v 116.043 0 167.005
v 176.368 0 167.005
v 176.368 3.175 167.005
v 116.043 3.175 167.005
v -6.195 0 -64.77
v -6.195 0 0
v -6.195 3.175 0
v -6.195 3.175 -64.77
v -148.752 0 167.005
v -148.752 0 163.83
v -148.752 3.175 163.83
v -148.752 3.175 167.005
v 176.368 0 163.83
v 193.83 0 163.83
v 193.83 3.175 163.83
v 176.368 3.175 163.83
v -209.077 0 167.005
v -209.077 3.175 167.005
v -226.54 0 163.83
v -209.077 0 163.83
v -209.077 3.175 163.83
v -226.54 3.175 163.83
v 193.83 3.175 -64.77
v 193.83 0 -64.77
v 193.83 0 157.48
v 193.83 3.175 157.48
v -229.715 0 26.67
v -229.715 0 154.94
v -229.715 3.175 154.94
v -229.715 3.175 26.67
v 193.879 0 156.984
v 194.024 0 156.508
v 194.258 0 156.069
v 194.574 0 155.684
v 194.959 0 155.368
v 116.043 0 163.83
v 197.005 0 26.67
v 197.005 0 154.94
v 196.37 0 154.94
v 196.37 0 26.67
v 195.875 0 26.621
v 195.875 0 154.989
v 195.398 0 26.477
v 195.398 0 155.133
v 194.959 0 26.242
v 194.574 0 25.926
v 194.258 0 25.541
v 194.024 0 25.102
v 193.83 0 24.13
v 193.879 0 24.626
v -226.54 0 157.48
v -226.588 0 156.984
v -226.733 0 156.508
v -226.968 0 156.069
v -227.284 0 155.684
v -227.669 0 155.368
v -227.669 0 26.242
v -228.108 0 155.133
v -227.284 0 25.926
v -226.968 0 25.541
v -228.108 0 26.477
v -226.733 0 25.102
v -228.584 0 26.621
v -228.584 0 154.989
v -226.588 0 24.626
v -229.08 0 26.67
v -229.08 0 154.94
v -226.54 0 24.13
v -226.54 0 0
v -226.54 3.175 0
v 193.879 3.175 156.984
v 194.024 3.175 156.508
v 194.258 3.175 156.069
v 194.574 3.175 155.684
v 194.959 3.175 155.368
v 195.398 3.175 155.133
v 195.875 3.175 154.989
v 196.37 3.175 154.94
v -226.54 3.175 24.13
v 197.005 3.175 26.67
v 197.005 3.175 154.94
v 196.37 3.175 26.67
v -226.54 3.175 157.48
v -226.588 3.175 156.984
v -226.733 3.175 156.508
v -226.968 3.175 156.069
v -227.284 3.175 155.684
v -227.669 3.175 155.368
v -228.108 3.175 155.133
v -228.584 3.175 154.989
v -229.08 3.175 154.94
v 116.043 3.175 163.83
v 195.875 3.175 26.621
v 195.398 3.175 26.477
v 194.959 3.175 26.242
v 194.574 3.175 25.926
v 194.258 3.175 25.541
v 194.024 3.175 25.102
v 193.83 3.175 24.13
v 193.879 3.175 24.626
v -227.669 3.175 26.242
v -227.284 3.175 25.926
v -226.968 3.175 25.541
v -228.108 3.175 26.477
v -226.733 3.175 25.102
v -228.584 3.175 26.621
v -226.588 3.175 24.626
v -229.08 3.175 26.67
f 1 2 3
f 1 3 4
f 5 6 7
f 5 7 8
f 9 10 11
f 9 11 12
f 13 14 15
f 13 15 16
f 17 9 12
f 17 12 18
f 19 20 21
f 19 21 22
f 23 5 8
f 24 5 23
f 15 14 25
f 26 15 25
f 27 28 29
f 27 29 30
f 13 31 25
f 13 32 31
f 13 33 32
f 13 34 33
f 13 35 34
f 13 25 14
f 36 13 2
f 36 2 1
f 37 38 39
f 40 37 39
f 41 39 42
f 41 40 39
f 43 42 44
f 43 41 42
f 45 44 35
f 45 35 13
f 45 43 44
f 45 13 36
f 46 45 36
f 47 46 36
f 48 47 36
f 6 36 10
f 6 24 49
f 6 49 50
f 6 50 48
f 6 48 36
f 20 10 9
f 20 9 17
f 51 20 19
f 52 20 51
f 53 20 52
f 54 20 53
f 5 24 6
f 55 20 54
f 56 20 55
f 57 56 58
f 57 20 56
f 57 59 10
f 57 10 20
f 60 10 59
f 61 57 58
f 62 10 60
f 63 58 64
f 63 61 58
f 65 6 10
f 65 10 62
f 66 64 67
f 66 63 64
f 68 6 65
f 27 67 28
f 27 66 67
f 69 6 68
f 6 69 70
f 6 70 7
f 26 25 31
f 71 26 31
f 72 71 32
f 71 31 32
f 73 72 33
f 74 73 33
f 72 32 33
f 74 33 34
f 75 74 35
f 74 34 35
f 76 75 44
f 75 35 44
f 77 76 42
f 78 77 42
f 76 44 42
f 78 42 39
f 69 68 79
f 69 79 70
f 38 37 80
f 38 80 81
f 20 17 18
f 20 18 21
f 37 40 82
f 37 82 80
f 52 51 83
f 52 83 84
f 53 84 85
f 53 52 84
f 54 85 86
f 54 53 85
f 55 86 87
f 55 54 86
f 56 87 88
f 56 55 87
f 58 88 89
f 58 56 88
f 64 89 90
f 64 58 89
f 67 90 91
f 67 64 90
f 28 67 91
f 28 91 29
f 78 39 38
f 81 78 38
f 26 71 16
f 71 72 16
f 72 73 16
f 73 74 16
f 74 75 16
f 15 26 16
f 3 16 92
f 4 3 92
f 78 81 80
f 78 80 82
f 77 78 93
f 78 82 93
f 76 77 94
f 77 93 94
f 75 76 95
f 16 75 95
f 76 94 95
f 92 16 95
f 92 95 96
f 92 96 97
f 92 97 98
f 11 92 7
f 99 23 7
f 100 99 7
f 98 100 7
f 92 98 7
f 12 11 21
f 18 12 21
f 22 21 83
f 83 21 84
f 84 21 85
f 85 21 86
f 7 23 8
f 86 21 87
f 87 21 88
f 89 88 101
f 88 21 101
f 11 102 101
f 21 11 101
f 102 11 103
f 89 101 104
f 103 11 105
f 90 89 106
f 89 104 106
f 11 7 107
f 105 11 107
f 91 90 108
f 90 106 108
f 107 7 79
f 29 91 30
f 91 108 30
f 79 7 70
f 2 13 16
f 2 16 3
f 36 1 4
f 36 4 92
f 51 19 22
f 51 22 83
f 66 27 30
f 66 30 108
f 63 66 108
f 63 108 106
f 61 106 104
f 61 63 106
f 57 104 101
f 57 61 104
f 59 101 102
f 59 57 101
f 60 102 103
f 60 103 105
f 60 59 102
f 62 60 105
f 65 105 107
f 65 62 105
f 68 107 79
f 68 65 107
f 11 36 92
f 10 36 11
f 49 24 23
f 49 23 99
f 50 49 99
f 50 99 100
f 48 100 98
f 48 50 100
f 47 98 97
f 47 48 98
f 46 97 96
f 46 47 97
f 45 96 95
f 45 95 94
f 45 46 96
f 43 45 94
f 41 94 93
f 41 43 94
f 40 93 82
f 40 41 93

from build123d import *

# Parameters (mm, degrees)
BOSS_EXTRUDE1_DEPTH     = 3.175
CUT_EXTRUDE1_DEPTH      = 285.023893051
CUT_EXTRUDE1_DEPTH_BACK = 285.023893051


with BuildPart() as part:
    # Sketch1 → Boss-Extrude1 (new body)
    with BuildSketch(Plane(origin=(0, 0, 0), x_dir=(1, 0, 0), z_dir=(0, 1, 0))):
        with BuildLine():
            Line((197.005348369, -26.67), (197.005348369, -163.83))
            Line((197.005348369, -163.83), (176.367848369, -163.83))
            Line((176.367848369, -163.83), (176.367848369, -167.005))
            Line((176.367848369, -167.005), (116.042848369, -167.005))
            Line((116.042848369, -167.005), (116.042848369, -163.83))
            Line((116.042848369, -163.83), (-116.042848369, -163.83))
            Line((-116.042848369, -163.83), (-148.752151631, -163.83))
            Line((-148.752151631, -163.83), (-148.752151631, -167.005))
            Line((-148.752151631, -167.005), (-209.077151631, -167.005))
            Line((-209.077151631, -167.005), (-209.077151631, -163.83))
            Line((-209.077151631, -163.83), (-226.539651631, -163.83))
            Line((-226.539651631, -163.83), (-226.539651631, -157.48))
            ThreePointArc((-226.539651631, -157.48), (-227.283600406, -155.683948776), (-229.079651631, -154.94))
            Line((-229.079651631, -154.94), (-229.714651631, -154.94))
            Line((-229.714651631, -154.94), (-229.714651631, -26.67))
            Line((-229.714651631, -26.67), (-229.079651631, -26.67))
            ThreePointArc((-229.079651631, -26.67), (-227.283600406, -25.926051224), (-226.539651631, -24.13))
            Line((-226.539651631, -24.13), (-226.539651631, 0))
            Line((-226.539651631, 0), (-6.194651631, 0))
            Line((-6.194651631, 0), (-6.194651631, 64.77))
            Line((-6.194651631, 64.77), (193.830348369, 64.77))
            Line((193.830348369, 64.77), (193.830348369, -24.13))
            ThreePointArc((193.830348369, -24.13), (194.574297145, -25.926051224), (196.370348369, -26.67))
            Line((196.370348369, -26.67), (197.005348369, -26.67))
        make_face()
    extrude(amount=BOSS_EXTRUDE1_DEPTH)

    # Sketch2 → Cut-Extrude1 (cut, two sides: drawn at the far end of the back side and taken through both)
    with BuildSketch(Plane(origin=(0, 3.175, 0), x_dir=(1, 0, 0), z_dir=(0, 1, 0)).offset(-CUT_EXTRUDE1_DEPTH_BACK)):
        with BuildLine():
            Line((197.005348369, -163.83), (193.830348369, -163.83))
            Line((193.830348369, -163.83), (193.830348369, -157.48))
            ThreePointArc((193.830348369, -157.48), (194.574297145, -155.683948776), (196.370348369, -154.94))
            Line((196.370348369, -154.94), (197.005348369, -154.94))
            Line((197.005348369, -154.94), (197.005348369, -163.83))
        make_face()
    extrude(amount=CUT_EXTRUDE1_DEPTH + CUT_EXTRUDE1_DEPTH_BACK, mode=Mode.SUBTRACT)


solid = part.part
